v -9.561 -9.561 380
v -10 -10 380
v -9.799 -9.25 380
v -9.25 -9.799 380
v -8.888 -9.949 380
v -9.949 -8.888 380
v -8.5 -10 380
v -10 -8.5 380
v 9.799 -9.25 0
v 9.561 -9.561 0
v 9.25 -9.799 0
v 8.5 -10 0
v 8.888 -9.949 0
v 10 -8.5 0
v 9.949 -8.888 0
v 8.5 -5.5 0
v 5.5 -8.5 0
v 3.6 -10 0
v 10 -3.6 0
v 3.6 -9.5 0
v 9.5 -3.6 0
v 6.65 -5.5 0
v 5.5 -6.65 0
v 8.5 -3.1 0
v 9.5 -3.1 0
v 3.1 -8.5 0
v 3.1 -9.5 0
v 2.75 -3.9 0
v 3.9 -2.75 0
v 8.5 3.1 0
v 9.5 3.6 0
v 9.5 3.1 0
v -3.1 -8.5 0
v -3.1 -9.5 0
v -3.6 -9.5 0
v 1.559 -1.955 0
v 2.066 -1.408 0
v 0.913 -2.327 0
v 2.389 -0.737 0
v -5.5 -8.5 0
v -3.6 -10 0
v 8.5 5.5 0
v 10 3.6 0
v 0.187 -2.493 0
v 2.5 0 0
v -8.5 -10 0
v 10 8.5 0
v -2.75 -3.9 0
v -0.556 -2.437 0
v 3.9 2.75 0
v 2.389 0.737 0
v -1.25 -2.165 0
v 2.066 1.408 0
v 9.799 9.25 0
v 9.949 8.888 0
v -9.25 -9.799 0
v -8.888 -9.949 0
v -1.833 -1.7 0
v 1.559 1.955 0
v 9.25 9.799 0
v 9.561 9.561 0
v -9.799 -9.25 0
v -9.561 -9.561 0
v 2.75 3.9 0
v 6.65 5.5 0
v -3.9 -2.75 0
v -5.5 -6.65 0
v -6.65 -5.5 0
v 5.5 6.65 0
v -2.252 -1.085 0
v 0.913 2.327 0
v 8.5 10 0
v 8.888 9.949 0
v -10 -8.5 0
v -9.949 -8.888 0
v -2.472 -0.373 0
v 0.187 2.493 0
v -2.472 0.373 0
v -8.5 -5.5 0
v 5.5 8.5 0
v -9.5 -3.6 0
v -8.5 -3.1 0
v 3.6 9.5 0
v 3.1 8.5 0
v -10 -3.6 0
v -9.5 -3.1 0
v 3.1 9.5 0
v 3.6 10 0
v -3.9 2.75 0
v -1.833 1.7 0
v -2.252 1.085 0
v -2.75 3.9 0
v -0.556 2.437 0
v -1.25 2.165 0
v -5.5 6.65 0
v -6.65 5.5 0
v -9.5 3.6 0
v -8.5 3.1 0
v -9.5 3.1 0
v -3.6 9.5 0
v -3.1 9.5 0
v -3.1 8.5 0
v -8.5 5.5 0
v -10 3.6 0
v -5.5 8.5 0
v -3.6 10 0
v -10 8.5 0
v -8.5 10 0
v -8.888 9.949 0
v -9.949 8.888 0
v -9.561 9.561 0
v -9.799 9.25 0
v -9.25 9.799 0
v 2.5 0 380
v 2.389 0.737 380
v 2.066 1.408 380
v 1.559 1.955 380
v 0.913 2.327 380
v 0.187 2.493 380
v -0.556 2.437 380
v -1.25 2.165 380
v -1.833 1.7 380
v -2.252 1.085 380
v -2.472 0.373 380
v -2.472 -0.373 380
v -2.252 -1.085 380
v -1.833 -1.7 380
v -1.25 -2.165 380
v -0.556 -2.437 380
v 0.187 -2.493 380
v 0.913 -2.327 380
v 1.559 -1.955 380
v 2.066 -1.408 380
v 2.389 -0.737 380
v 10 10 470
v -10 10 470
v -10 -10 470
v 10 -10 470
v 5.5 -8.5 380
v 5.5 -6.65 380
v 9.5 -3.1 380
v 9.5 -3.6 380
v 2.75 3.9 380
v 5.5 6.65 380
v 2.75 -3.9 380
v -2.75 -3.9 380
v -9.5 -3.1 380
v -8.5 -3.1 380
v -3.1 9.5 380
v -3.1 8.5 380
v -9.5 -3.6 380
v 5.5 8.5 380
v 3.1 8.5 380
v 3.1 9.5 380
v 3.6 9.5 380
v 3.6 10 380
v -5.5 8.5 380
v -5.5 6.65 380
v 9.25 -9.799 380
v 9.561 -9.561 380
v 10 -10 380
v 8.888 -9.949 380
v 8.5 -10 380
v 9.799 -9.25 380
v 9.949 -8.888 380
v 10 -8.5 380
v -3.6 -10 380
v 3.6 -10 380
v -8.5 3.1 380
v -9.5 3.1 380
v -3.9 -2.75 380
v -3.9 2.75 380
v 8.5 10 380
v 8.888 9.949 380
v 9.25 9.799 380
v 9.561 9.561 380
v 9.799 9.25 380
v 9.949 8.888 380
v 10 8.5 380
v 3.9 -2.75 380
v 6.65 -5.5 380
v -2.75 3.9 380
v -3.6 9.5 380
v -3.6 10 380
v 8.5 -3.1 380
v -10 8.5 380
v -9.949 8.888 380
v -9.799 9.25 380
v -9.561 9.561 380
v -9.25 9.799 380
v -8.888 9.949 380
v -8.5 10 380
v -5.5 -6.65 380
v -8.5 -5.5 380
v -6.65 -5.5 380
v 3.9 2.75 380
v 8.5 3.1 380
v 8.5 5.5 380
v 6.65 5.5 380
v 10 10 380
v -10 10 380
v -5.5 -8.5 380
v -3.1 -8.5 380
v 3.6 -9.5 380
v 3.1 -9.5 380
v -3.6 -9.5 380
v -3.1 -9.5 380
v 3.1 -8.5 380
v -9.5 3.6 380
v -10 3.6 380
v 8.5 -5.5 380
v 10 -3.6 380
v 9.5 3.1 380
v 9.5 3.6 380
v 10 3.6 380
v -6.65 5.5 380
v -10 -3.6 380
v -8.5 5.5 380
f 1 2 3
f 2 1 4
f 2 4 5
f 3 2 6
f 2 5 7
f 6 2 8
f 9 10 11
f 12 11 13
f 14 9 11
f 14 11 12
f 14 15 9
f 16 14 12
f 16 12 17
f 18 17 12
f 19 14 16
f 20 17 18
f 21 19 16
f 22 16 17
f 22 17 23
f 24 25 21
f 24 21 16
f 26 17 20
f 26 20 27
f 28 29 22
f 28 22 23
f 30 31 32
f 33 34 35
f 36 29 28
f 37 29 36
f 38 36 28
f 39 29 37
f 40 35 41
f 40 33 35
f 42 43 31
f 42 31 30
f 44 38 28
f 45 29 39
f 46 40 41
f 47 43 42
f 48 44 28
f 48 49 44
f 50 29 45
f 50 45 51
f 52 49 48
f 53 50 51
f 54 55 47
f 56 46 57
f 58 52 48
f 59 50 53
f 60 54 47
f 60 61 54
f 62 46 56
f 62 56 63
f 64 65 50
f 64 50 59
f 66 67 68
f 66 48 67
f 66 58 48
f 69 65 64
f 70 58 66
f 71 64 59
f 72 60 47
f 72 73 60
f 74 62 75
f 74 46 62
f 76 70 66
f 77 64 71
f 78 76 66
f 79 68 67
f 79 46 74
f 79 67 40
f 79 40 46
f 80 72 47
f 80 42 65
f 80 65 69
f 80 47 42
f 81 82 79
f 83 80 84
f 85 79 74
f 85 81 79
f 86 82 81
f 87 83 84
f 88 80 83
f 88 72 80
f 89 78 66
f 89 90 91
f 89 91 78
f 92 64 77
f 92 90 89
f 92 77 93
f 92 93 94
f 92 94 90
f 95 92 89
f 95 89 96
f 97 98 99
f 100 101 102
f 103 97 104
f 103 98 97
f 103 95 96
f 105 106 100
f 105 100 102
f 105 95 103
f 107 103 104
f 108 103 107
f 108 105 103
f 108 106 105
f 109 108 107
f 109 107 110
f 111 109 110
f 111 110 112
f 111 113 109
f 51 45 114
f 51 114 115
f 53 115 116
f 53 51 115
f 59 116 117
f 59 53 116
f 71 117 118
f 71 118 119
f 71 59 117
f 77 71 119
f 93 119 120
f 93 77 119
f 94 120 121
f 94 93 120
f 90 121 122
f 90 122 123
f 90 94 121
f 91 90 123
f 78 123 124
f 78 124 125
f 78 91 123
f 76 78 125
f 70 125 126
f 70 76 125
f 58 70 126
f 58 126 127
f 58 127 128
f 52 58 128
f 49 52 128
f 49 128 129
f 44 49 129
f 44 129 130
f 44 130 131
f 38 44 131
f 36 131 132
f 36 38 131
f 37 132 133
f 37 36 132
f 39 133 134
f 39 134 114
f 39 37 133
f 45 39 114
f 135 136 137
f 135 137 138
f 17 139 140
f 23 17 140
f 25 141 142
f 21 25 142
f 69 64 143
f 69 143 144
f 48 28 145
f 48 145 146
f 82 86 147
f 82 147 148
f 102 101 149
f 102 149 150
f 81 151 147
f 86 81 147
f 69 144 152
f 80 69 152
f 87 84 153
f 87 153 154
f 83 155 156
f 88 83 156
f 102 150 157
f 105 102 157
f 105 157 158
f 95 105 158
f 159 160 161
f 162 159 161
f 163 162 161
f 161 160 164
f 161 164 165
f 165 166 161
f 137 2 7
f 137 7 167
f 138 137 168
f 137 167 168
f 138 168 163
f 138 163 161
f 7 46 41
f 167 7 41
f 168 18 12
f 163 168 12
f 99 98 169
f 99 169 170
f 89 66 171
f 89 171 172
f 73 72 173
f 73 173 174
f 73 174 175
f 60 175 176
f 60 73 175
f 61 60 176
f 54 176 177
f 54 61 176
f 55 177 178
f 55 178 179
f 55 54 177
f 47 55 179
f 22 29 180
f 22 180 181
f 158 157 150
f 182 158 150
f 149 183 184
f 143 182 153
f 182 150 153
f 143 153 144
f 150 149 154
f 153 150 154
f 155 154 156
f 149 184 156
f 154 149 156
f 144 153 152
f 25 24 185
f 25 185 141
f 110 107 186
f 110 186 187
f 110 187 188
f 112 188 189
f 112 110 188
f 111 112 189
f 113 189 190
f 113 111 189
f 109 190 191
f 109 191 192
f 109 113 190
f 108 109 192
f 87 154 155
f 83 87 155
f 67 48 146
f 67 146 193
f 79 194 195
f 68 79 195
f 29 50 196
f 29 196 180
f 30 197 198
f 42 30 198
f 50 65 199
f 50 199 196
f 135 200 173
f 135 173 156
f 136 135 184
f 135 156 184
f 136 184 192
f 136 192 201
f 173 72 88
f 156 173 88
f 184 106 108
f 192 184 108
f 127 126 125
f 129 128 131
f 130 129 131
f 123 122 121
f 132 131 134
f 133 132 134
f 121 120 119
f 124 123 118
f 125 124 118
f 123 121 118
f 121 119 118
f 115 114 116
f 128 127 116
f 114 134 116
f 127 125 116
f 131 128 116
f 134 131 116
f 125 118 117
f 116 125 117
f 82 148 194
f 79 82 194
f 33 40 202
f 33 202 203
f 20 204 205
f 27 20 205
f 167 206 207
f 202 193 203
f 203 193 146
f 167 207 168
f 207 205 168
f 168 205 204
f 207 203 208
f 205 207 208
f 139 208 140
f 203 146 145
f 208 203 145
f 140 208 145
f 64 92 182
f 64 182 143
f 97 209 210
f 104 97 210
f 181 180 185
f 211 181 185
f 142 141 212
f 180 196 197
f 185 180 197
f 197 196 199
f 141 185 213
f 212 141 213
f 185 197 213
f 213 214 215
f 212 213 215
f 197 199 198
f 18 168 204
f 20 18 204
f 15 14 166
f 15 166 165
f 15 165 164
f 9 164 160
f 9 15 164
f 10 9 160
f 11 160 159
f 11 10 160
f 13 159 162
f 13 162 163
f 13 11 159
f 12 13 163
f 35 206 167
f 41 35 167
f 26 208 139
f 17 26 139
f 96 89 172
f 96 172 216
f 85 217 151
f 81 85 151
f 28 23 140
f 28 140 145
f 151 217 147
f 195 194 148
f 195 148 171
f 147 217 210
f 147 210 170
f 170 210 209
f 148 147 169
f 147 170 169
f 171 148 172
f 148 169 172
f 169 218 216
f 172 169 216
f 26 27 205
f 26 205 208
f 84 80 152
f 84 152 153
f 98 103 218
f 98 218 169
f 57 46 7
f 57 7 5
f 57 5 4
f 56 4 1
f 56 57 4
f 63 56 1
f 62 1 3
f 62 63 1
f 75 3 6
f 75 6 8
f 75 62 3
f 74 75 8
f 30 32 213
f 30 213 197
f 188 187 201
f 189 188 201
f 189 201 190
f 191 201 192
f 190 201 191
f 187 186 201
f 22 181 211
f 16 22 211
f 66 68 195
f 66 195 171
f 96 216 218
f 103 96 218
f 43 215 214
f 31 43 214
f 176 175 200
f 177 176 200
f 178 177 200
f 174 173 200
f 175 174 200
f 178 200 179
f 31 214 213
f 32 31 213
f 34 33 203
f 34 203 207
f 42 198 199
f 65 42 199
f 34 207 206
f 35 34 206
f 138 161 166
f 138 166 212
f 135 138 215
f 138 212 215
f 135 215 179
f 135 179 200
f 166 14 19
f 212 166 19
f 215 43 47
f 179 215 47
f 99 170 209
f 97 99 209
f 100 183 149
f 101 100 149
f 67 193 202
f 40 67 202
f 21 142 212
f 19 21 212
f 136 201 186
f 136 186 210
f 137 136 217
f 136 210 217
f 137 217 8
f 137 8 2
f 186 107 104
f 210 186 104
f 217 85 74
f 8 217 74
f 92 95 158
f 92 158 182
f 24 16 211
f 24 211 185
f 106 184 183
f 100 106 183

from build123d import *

# Parameters (mm, degrees)
SKETCH_1_R      = 2.5
EXTRUDE_1_DEPTH = 380
EXTRUDE_2_DEPTH = 90


with BuildPart() as part:
    # 草图1 → 凸台-拉伸1 (new body)
    with BuildSketch(Plane.XY):
        with BuildLine():
            Line((-3.6, 10), (-3.6, 9.5))
            Line((-3.6, 9.5), (-3.1, 9.5))
            Line((-3.1, 9.5), (-3.1, 8.5))
            Line((-3.1, 8.5), (-5.5, 8.5))
            Line((-5.5, 8.5), (-5.5, 6.65))
            Line((-5.5, 6.65), (-2.75, 3.9))
            Line((-2.75, 3.9), (2.75, 3.9))
            Line((2.75, 3.9), (5.5, 6.65))
            Line((5.5, 6.65), (5.5, 8.5))
            Line((5.5, 8.5), (3.1, 8.5))
            Line((3.1, 8.5), (3.1, 9.5))
            Line((3.1, 9.5), (3.6, 9.5))
            Line((3.6, 9.5), (3.6, 10))
            Line((3.6, 10), (8.5, 10))
            ThreePointArc((8.5, 10), (9.560660172, 9.560660172), (10, 8.5))
            Line((10, 8.5), (10, 3.6))
            Line((10, 3.6), (9.5, 3.6))
            Line((9.5, 3.6), (9.5, 3.1))
            Line((9.5, 3.1), (8.5, 3.1))
            Line((8.5, 3.1), (8.5, 5.5))
            Line((8.5, 5.5), (6.65, 5.5))
            Line((6.65, 5.5), (3.9, 2.75))
            Line((3.9, 2.75), (3.9, -2.75))
            Line((3.9, -2.75), (6.65, -5.5))
            Line((6.65, -5.5), (8.5, -5.5))
            Line((8.5, -5.5), (8.5, -3.1))
            Line((8.5, -3.1), (9.5, -3.1))
            Line((9.5, -3.1), (9.5, -3.6))
            Line((9.5, -3.6), (10, -3.6))
            Line((10, -3.6), (10, -8.5))
            ThreePointArc((10, -8.5), (9.560660172, -9.560660172), (8.5, -10))
            Line((8.5, -10), (3.6, -10))
            Line((3.6, -10), (3.6, -9.5))
            Line((3.6, -9.5), (3.1, -9.5))
            Line((3.1, -9.5), (3.1, -8.5))
            Line((3.1, -8.5), (5.5, -8.5))
            Line((5.5, -8.5), (5.5, -6.65))
            Line((5.5, -6.65), (2.75, -3.9))
            Line((2.75, -3.9), (-2.75, -3.9))
            Line((-2.75, -3.9), (-5.5, -6.65))
            Line((-5.5, -6.65), (-5.5, -8.5))
            Line((-5.5, -8.5), (-3.1, -8.5))
            Line((-3.1, -8.5), (-3.1, -9.5))
            Line((-3.1, -9.5), (-3.6, -9.5))
            Line((-3.6, -9.5), (-3.6, -10))
            Line((-3.6, -10), (-8.5, -10))
            ThreePointArc((-8.5, -10), (-9.560660172, -9.560660172), (-10, -8.5))
            Line((-10, -8.5), (-10, -3.6))
            Line((-10, -3.6), (-9.5, -3.6))
            Line((-9.5, -3.6), (-9.5, -3.1))
            Line((-9.5, -3.1), (-8.5, -3.1))
            Line((-8.5, -3.1), (-8.5, -5.5))
            Line((-8.5, -5.5), (-6.65, -5.5))
            Line((-6.65, -5.5), (-3.9, -2.75))
            Line((-3.9, -2.75), (-3.9, 2.75))
            Line((-3.9, 2.75), (-6.65, 5.5))
            Line((-6.65, 5.5), (-8.5, 5.5))
            Line((-8.5, 5.5), (-8.5, 3.1))
            Line((-8.5, 3.1), (-9.5, 3.1))
            Line((-9.5, 3.1), (-9.5, 3.6))
            Line((-9.5, 3.6), (-10, 3.6))
            Line((-10, 3.6), (-10, 8.5))
            ThreePointArc((-10, 8.5), (-9.560660172, 9.560660172), (-8.5, 10))
            Line((-8.5, 10), (-3.6, 10))
        make_face()
        Circle(SKETCH_1_R, mode=Mode.SUBTRACT)
    extrude(amount=EXTRUDE_1_DEPTH)

    # 草图2 → 凸台-拉伸2 (add)
    with BuildSketch(Plane.XY.offset(380)):
        Polygon((8.5, 10), (-8.5, 10), (-10, 10), (-10, 8.5), (-10, -8.5), (-10, -10), (-8.5, -10), (8.5, -10), (10, -10), (10, -8.5), (10, 8.5), (10, 10), align=None)
    extrude(amount=EXTRUDE_2_DEPTH)


solid = part.part
